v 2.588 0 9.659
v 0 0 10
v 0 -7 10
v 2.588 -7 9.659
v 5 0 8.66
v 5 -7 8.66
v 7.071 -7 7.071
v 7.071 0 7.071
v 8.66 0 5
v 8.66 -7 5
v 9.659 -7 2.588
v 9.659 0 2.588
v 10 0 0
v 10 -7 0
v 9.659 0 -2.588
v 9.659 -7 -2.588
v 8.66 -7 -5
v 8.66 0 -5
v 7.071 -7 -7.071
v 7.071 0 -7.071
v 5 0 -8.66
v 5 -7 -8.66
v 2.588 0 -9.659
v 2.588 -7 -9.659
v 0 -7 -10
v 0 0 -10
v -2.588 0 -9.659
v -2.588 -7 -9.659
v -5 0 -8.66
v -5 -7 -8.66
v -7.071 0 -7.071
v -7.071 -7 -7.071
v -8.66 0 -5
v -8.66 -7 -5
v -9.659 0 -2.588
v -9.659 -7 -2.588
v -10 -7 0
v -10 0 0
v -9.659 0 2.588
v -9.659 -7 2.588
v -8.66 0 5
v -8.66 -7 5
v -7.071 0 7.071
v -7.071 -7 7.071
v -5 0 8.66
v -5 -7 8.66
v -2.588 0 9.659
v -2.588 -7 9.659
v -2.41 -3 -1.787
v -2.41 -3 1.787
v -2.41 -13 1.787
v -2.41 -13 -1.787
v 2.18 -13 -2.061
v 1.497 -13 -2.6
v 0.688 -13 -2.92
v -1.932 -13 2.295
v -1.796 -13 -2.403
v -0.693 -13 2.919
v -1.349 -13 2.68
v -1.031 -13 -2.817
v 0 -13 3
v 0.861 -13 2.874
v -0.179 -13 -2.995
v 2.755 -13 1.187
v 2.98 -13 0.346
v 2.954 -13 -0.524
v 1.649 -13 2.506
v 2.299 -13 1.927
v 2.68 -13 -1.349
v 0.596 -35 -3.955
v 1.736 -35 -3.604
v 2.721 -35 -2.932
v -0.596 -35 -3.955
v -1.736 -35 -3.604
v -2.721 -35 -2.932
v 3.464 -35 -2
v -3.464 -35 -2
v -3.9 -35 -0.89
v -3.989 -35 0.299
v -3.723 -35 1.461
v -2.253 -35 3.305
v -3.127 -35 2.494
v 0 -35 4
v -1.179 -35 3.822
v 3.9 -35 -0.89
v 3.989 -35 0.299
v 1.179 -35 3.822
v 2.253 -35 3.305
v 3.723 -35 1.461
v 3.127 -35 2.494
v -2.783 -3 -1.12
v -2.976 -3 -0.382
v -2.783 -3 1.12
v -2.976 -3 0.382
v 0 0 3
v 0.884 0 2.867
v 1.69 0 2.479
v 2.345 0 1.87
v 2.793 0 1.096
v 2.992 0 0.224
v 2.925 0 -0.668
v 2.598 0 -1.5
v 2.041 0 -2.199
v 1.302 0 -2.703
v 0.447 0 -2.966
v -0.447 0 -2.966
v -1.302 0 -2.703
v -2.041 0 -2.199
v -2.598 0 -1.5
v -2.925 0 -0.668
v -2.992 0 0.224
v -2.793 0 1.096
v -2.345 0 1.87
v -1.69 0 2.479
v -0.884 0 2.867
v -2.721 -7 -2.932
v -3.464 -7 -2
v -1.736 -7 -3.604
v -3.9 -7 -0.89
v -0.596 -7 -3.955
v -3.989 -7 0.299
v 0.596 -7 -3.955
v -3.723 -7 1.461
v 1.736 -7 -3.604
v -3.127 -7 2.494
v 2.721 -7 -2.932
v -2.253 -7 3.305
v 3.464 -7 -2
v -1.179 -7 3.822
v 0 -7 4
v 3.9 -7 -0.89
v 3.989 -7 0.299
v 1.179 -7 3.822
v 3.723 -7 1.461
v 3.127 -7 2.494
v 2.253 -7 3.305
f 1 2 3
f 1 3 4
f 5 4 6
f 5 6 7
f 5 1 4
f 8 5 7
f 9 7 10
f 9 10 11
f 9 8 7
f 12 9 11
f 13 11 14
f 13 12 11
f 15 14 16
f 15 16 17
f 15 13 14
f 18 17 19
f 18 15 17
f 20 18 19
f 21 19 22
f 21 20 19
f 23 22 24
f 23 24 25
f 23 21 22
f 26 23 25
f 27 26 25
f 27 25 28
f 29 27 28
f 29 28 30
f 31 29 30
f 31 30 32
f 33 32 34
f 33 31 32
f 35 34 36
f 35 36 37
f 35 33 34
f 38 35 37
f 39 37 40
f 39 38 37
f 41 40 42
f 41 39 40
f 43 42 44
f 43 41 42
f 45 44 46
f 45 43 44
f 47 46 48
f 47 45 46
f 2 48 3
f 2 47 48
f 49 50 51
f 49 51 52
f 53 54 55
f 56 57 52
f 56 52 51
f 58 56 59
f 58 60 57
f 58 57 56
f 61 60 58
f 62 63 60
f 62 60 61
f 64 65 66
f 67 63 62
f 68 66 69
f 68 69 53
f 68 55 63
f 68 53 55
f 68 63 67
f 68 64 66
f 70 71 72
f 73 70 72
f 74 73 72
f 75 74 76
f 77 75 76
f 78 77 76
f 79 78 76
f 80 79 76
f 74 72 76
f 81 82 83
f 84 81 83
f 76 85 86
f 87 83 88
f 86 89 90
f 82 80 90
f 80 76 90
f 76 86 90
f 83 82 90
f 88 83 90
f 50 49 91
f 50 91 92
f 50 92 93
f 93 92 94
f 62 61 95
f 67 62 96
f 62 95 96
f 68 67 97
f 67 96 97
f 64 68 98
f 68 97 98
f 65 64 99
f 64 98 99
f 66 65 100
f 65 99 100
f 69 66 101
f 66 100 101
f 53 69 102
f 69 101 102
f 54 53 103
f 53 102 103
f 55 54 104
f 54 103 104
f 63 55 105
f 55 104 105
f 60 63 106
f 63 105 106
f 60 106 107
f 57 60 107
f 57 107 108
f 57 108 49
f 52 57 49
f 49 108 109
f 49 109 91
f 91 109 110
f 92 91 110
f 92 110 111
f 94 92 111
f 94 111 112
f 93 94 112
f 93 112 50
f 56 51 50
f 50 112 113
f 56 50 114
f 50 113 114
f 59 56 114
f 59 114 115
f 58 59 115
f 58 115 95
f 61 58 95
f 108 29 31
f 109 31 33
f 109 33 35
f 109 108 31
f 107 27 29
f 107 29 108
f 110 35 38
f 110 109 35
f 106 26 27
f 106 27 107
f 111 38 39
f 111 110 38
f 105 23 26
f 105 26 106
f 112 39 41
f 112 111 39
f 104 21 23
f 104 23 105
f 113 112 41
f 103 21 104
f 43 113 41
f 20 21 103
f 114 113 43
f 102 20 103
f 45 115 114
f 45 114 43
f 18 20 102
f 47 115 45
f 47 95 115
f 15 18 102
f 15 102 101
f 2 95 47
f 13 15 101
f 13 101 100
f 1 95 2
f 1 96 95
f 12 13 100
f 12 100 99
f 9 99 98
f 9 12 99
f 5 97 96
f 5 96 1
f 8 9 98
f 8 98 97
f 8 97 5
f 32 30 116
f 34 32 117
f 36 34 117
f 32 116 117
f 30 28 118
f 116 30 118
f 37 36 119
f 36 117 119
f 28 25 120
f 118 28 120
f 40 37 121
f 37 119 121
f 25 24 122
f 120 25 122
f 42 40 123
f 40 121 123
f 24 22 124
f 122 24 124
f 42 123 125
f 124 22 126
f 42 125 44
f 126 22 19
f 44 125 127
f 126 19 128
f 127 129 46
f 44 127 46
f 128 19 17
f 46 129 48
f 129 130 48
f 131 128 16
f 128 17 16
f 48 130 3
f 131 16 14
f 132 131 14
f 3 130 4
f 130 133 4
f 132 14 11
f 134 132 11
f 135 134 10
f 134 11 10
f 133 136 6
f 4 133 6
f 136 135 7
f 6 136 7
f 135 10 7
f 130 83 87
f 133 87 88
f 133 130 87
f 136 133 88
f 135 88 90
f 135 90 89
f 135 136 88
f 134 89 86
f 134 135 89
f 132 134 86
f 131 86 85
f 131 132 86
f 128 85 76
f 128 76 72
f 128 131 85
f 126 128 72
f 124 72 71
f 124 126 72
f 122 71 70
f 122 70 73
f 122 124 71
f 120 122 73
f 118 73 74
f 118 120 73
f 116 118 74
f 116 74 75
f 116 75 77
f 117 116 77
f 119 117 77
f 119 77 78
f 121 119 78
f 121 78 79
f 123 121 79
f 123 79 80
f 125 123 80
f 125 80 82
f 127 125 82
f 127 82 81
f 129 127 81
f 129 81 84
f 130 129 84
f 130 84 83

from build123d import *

# Parameters (mm, degrees)
ESQUISSE1_R             = 4
BOSS_EXTRU_1_DEPTH      = 35
ESQUISSE2_R             = 3
ENL_V_MAT_EXTRU_1_DEPTH = 13
BOSS_EXTRU_2_START      = 10
BOSS_EXTRU_2_DEPTH      = 10
ESQUISSE5_R             = 10
ESQUISSE5_R_2           = 4
BOSS_EXTRU_3_DEPTH      = 7


with BuildPart() as part:
    # Esquisse1 → Boss.-Extru.1 (new body)
    with BuildSketch(Plane(origin=(0, 0, 0), x_dir=(1, 0, 0), z_dir=(0, 1, 0))):
        with Locations(Location((0, 0, 0), (0, 0, 270))):
            Circle(ESQUISSE1_R)
    extrude(amount=-BOSS_EXTRU_1_DEPTH)

    # Esquisse2 → Enlèv. mat.-Extru.1 (cut)
    with BuildSketch(Plane(origin=(0, 0, 0), x_dir=(1, 0, 0), z_dir=(0, 1, 0))):
        with Locations(Location((0, 0, 0), (0, 0, 270))):
            Circle(ESQUISSE2_R)
    extrude(amount=-ENL_V_MAT_EXTRU_1_DEPTH, mode=Mode.SUBTRACT)

    # Esquisse4 → Boss.-Extru.2 (add)
    with BuildSketch(Plane(origin=(0, -13, 0), x_dir=(1, 0, 0), z_dir=(0, 1, 0)).offset(BOSS_EXTRU_2_START)):
        with BuildLine():
            Line((-2.41, -1.786588929), (-2.41, 0))
            Line((-2.41, 0), (-2.41, 1.786588929))
            ThreePointArc((-2.41, 1.786588929), (-3, 0), (-2.41, -1.786588929))
        make_face()
    extrude(amount=-BOSS_EXTRU_2_DEPTH)

    # Esquisse5 → Boss.-Extru.3 (add)
    with BuildSketch(Plane(origin=(0, 0, 0), x_dir=(1, 0, 0), z_dir=(0, 1, 0))):
        with Locations(Location((0, 0, 0), (0, 0, 270))):
            Circle(ESQUISSE5_R)
        with Locations(Location((0, 0, 0), (0, 0, 270))):
            Circle(ESQUISSE5_R_2, mode=Mode.SUBTRACT)
    extrude(amount=-BOSS_EXTRU_3_DEPTH)


solid = part.part
